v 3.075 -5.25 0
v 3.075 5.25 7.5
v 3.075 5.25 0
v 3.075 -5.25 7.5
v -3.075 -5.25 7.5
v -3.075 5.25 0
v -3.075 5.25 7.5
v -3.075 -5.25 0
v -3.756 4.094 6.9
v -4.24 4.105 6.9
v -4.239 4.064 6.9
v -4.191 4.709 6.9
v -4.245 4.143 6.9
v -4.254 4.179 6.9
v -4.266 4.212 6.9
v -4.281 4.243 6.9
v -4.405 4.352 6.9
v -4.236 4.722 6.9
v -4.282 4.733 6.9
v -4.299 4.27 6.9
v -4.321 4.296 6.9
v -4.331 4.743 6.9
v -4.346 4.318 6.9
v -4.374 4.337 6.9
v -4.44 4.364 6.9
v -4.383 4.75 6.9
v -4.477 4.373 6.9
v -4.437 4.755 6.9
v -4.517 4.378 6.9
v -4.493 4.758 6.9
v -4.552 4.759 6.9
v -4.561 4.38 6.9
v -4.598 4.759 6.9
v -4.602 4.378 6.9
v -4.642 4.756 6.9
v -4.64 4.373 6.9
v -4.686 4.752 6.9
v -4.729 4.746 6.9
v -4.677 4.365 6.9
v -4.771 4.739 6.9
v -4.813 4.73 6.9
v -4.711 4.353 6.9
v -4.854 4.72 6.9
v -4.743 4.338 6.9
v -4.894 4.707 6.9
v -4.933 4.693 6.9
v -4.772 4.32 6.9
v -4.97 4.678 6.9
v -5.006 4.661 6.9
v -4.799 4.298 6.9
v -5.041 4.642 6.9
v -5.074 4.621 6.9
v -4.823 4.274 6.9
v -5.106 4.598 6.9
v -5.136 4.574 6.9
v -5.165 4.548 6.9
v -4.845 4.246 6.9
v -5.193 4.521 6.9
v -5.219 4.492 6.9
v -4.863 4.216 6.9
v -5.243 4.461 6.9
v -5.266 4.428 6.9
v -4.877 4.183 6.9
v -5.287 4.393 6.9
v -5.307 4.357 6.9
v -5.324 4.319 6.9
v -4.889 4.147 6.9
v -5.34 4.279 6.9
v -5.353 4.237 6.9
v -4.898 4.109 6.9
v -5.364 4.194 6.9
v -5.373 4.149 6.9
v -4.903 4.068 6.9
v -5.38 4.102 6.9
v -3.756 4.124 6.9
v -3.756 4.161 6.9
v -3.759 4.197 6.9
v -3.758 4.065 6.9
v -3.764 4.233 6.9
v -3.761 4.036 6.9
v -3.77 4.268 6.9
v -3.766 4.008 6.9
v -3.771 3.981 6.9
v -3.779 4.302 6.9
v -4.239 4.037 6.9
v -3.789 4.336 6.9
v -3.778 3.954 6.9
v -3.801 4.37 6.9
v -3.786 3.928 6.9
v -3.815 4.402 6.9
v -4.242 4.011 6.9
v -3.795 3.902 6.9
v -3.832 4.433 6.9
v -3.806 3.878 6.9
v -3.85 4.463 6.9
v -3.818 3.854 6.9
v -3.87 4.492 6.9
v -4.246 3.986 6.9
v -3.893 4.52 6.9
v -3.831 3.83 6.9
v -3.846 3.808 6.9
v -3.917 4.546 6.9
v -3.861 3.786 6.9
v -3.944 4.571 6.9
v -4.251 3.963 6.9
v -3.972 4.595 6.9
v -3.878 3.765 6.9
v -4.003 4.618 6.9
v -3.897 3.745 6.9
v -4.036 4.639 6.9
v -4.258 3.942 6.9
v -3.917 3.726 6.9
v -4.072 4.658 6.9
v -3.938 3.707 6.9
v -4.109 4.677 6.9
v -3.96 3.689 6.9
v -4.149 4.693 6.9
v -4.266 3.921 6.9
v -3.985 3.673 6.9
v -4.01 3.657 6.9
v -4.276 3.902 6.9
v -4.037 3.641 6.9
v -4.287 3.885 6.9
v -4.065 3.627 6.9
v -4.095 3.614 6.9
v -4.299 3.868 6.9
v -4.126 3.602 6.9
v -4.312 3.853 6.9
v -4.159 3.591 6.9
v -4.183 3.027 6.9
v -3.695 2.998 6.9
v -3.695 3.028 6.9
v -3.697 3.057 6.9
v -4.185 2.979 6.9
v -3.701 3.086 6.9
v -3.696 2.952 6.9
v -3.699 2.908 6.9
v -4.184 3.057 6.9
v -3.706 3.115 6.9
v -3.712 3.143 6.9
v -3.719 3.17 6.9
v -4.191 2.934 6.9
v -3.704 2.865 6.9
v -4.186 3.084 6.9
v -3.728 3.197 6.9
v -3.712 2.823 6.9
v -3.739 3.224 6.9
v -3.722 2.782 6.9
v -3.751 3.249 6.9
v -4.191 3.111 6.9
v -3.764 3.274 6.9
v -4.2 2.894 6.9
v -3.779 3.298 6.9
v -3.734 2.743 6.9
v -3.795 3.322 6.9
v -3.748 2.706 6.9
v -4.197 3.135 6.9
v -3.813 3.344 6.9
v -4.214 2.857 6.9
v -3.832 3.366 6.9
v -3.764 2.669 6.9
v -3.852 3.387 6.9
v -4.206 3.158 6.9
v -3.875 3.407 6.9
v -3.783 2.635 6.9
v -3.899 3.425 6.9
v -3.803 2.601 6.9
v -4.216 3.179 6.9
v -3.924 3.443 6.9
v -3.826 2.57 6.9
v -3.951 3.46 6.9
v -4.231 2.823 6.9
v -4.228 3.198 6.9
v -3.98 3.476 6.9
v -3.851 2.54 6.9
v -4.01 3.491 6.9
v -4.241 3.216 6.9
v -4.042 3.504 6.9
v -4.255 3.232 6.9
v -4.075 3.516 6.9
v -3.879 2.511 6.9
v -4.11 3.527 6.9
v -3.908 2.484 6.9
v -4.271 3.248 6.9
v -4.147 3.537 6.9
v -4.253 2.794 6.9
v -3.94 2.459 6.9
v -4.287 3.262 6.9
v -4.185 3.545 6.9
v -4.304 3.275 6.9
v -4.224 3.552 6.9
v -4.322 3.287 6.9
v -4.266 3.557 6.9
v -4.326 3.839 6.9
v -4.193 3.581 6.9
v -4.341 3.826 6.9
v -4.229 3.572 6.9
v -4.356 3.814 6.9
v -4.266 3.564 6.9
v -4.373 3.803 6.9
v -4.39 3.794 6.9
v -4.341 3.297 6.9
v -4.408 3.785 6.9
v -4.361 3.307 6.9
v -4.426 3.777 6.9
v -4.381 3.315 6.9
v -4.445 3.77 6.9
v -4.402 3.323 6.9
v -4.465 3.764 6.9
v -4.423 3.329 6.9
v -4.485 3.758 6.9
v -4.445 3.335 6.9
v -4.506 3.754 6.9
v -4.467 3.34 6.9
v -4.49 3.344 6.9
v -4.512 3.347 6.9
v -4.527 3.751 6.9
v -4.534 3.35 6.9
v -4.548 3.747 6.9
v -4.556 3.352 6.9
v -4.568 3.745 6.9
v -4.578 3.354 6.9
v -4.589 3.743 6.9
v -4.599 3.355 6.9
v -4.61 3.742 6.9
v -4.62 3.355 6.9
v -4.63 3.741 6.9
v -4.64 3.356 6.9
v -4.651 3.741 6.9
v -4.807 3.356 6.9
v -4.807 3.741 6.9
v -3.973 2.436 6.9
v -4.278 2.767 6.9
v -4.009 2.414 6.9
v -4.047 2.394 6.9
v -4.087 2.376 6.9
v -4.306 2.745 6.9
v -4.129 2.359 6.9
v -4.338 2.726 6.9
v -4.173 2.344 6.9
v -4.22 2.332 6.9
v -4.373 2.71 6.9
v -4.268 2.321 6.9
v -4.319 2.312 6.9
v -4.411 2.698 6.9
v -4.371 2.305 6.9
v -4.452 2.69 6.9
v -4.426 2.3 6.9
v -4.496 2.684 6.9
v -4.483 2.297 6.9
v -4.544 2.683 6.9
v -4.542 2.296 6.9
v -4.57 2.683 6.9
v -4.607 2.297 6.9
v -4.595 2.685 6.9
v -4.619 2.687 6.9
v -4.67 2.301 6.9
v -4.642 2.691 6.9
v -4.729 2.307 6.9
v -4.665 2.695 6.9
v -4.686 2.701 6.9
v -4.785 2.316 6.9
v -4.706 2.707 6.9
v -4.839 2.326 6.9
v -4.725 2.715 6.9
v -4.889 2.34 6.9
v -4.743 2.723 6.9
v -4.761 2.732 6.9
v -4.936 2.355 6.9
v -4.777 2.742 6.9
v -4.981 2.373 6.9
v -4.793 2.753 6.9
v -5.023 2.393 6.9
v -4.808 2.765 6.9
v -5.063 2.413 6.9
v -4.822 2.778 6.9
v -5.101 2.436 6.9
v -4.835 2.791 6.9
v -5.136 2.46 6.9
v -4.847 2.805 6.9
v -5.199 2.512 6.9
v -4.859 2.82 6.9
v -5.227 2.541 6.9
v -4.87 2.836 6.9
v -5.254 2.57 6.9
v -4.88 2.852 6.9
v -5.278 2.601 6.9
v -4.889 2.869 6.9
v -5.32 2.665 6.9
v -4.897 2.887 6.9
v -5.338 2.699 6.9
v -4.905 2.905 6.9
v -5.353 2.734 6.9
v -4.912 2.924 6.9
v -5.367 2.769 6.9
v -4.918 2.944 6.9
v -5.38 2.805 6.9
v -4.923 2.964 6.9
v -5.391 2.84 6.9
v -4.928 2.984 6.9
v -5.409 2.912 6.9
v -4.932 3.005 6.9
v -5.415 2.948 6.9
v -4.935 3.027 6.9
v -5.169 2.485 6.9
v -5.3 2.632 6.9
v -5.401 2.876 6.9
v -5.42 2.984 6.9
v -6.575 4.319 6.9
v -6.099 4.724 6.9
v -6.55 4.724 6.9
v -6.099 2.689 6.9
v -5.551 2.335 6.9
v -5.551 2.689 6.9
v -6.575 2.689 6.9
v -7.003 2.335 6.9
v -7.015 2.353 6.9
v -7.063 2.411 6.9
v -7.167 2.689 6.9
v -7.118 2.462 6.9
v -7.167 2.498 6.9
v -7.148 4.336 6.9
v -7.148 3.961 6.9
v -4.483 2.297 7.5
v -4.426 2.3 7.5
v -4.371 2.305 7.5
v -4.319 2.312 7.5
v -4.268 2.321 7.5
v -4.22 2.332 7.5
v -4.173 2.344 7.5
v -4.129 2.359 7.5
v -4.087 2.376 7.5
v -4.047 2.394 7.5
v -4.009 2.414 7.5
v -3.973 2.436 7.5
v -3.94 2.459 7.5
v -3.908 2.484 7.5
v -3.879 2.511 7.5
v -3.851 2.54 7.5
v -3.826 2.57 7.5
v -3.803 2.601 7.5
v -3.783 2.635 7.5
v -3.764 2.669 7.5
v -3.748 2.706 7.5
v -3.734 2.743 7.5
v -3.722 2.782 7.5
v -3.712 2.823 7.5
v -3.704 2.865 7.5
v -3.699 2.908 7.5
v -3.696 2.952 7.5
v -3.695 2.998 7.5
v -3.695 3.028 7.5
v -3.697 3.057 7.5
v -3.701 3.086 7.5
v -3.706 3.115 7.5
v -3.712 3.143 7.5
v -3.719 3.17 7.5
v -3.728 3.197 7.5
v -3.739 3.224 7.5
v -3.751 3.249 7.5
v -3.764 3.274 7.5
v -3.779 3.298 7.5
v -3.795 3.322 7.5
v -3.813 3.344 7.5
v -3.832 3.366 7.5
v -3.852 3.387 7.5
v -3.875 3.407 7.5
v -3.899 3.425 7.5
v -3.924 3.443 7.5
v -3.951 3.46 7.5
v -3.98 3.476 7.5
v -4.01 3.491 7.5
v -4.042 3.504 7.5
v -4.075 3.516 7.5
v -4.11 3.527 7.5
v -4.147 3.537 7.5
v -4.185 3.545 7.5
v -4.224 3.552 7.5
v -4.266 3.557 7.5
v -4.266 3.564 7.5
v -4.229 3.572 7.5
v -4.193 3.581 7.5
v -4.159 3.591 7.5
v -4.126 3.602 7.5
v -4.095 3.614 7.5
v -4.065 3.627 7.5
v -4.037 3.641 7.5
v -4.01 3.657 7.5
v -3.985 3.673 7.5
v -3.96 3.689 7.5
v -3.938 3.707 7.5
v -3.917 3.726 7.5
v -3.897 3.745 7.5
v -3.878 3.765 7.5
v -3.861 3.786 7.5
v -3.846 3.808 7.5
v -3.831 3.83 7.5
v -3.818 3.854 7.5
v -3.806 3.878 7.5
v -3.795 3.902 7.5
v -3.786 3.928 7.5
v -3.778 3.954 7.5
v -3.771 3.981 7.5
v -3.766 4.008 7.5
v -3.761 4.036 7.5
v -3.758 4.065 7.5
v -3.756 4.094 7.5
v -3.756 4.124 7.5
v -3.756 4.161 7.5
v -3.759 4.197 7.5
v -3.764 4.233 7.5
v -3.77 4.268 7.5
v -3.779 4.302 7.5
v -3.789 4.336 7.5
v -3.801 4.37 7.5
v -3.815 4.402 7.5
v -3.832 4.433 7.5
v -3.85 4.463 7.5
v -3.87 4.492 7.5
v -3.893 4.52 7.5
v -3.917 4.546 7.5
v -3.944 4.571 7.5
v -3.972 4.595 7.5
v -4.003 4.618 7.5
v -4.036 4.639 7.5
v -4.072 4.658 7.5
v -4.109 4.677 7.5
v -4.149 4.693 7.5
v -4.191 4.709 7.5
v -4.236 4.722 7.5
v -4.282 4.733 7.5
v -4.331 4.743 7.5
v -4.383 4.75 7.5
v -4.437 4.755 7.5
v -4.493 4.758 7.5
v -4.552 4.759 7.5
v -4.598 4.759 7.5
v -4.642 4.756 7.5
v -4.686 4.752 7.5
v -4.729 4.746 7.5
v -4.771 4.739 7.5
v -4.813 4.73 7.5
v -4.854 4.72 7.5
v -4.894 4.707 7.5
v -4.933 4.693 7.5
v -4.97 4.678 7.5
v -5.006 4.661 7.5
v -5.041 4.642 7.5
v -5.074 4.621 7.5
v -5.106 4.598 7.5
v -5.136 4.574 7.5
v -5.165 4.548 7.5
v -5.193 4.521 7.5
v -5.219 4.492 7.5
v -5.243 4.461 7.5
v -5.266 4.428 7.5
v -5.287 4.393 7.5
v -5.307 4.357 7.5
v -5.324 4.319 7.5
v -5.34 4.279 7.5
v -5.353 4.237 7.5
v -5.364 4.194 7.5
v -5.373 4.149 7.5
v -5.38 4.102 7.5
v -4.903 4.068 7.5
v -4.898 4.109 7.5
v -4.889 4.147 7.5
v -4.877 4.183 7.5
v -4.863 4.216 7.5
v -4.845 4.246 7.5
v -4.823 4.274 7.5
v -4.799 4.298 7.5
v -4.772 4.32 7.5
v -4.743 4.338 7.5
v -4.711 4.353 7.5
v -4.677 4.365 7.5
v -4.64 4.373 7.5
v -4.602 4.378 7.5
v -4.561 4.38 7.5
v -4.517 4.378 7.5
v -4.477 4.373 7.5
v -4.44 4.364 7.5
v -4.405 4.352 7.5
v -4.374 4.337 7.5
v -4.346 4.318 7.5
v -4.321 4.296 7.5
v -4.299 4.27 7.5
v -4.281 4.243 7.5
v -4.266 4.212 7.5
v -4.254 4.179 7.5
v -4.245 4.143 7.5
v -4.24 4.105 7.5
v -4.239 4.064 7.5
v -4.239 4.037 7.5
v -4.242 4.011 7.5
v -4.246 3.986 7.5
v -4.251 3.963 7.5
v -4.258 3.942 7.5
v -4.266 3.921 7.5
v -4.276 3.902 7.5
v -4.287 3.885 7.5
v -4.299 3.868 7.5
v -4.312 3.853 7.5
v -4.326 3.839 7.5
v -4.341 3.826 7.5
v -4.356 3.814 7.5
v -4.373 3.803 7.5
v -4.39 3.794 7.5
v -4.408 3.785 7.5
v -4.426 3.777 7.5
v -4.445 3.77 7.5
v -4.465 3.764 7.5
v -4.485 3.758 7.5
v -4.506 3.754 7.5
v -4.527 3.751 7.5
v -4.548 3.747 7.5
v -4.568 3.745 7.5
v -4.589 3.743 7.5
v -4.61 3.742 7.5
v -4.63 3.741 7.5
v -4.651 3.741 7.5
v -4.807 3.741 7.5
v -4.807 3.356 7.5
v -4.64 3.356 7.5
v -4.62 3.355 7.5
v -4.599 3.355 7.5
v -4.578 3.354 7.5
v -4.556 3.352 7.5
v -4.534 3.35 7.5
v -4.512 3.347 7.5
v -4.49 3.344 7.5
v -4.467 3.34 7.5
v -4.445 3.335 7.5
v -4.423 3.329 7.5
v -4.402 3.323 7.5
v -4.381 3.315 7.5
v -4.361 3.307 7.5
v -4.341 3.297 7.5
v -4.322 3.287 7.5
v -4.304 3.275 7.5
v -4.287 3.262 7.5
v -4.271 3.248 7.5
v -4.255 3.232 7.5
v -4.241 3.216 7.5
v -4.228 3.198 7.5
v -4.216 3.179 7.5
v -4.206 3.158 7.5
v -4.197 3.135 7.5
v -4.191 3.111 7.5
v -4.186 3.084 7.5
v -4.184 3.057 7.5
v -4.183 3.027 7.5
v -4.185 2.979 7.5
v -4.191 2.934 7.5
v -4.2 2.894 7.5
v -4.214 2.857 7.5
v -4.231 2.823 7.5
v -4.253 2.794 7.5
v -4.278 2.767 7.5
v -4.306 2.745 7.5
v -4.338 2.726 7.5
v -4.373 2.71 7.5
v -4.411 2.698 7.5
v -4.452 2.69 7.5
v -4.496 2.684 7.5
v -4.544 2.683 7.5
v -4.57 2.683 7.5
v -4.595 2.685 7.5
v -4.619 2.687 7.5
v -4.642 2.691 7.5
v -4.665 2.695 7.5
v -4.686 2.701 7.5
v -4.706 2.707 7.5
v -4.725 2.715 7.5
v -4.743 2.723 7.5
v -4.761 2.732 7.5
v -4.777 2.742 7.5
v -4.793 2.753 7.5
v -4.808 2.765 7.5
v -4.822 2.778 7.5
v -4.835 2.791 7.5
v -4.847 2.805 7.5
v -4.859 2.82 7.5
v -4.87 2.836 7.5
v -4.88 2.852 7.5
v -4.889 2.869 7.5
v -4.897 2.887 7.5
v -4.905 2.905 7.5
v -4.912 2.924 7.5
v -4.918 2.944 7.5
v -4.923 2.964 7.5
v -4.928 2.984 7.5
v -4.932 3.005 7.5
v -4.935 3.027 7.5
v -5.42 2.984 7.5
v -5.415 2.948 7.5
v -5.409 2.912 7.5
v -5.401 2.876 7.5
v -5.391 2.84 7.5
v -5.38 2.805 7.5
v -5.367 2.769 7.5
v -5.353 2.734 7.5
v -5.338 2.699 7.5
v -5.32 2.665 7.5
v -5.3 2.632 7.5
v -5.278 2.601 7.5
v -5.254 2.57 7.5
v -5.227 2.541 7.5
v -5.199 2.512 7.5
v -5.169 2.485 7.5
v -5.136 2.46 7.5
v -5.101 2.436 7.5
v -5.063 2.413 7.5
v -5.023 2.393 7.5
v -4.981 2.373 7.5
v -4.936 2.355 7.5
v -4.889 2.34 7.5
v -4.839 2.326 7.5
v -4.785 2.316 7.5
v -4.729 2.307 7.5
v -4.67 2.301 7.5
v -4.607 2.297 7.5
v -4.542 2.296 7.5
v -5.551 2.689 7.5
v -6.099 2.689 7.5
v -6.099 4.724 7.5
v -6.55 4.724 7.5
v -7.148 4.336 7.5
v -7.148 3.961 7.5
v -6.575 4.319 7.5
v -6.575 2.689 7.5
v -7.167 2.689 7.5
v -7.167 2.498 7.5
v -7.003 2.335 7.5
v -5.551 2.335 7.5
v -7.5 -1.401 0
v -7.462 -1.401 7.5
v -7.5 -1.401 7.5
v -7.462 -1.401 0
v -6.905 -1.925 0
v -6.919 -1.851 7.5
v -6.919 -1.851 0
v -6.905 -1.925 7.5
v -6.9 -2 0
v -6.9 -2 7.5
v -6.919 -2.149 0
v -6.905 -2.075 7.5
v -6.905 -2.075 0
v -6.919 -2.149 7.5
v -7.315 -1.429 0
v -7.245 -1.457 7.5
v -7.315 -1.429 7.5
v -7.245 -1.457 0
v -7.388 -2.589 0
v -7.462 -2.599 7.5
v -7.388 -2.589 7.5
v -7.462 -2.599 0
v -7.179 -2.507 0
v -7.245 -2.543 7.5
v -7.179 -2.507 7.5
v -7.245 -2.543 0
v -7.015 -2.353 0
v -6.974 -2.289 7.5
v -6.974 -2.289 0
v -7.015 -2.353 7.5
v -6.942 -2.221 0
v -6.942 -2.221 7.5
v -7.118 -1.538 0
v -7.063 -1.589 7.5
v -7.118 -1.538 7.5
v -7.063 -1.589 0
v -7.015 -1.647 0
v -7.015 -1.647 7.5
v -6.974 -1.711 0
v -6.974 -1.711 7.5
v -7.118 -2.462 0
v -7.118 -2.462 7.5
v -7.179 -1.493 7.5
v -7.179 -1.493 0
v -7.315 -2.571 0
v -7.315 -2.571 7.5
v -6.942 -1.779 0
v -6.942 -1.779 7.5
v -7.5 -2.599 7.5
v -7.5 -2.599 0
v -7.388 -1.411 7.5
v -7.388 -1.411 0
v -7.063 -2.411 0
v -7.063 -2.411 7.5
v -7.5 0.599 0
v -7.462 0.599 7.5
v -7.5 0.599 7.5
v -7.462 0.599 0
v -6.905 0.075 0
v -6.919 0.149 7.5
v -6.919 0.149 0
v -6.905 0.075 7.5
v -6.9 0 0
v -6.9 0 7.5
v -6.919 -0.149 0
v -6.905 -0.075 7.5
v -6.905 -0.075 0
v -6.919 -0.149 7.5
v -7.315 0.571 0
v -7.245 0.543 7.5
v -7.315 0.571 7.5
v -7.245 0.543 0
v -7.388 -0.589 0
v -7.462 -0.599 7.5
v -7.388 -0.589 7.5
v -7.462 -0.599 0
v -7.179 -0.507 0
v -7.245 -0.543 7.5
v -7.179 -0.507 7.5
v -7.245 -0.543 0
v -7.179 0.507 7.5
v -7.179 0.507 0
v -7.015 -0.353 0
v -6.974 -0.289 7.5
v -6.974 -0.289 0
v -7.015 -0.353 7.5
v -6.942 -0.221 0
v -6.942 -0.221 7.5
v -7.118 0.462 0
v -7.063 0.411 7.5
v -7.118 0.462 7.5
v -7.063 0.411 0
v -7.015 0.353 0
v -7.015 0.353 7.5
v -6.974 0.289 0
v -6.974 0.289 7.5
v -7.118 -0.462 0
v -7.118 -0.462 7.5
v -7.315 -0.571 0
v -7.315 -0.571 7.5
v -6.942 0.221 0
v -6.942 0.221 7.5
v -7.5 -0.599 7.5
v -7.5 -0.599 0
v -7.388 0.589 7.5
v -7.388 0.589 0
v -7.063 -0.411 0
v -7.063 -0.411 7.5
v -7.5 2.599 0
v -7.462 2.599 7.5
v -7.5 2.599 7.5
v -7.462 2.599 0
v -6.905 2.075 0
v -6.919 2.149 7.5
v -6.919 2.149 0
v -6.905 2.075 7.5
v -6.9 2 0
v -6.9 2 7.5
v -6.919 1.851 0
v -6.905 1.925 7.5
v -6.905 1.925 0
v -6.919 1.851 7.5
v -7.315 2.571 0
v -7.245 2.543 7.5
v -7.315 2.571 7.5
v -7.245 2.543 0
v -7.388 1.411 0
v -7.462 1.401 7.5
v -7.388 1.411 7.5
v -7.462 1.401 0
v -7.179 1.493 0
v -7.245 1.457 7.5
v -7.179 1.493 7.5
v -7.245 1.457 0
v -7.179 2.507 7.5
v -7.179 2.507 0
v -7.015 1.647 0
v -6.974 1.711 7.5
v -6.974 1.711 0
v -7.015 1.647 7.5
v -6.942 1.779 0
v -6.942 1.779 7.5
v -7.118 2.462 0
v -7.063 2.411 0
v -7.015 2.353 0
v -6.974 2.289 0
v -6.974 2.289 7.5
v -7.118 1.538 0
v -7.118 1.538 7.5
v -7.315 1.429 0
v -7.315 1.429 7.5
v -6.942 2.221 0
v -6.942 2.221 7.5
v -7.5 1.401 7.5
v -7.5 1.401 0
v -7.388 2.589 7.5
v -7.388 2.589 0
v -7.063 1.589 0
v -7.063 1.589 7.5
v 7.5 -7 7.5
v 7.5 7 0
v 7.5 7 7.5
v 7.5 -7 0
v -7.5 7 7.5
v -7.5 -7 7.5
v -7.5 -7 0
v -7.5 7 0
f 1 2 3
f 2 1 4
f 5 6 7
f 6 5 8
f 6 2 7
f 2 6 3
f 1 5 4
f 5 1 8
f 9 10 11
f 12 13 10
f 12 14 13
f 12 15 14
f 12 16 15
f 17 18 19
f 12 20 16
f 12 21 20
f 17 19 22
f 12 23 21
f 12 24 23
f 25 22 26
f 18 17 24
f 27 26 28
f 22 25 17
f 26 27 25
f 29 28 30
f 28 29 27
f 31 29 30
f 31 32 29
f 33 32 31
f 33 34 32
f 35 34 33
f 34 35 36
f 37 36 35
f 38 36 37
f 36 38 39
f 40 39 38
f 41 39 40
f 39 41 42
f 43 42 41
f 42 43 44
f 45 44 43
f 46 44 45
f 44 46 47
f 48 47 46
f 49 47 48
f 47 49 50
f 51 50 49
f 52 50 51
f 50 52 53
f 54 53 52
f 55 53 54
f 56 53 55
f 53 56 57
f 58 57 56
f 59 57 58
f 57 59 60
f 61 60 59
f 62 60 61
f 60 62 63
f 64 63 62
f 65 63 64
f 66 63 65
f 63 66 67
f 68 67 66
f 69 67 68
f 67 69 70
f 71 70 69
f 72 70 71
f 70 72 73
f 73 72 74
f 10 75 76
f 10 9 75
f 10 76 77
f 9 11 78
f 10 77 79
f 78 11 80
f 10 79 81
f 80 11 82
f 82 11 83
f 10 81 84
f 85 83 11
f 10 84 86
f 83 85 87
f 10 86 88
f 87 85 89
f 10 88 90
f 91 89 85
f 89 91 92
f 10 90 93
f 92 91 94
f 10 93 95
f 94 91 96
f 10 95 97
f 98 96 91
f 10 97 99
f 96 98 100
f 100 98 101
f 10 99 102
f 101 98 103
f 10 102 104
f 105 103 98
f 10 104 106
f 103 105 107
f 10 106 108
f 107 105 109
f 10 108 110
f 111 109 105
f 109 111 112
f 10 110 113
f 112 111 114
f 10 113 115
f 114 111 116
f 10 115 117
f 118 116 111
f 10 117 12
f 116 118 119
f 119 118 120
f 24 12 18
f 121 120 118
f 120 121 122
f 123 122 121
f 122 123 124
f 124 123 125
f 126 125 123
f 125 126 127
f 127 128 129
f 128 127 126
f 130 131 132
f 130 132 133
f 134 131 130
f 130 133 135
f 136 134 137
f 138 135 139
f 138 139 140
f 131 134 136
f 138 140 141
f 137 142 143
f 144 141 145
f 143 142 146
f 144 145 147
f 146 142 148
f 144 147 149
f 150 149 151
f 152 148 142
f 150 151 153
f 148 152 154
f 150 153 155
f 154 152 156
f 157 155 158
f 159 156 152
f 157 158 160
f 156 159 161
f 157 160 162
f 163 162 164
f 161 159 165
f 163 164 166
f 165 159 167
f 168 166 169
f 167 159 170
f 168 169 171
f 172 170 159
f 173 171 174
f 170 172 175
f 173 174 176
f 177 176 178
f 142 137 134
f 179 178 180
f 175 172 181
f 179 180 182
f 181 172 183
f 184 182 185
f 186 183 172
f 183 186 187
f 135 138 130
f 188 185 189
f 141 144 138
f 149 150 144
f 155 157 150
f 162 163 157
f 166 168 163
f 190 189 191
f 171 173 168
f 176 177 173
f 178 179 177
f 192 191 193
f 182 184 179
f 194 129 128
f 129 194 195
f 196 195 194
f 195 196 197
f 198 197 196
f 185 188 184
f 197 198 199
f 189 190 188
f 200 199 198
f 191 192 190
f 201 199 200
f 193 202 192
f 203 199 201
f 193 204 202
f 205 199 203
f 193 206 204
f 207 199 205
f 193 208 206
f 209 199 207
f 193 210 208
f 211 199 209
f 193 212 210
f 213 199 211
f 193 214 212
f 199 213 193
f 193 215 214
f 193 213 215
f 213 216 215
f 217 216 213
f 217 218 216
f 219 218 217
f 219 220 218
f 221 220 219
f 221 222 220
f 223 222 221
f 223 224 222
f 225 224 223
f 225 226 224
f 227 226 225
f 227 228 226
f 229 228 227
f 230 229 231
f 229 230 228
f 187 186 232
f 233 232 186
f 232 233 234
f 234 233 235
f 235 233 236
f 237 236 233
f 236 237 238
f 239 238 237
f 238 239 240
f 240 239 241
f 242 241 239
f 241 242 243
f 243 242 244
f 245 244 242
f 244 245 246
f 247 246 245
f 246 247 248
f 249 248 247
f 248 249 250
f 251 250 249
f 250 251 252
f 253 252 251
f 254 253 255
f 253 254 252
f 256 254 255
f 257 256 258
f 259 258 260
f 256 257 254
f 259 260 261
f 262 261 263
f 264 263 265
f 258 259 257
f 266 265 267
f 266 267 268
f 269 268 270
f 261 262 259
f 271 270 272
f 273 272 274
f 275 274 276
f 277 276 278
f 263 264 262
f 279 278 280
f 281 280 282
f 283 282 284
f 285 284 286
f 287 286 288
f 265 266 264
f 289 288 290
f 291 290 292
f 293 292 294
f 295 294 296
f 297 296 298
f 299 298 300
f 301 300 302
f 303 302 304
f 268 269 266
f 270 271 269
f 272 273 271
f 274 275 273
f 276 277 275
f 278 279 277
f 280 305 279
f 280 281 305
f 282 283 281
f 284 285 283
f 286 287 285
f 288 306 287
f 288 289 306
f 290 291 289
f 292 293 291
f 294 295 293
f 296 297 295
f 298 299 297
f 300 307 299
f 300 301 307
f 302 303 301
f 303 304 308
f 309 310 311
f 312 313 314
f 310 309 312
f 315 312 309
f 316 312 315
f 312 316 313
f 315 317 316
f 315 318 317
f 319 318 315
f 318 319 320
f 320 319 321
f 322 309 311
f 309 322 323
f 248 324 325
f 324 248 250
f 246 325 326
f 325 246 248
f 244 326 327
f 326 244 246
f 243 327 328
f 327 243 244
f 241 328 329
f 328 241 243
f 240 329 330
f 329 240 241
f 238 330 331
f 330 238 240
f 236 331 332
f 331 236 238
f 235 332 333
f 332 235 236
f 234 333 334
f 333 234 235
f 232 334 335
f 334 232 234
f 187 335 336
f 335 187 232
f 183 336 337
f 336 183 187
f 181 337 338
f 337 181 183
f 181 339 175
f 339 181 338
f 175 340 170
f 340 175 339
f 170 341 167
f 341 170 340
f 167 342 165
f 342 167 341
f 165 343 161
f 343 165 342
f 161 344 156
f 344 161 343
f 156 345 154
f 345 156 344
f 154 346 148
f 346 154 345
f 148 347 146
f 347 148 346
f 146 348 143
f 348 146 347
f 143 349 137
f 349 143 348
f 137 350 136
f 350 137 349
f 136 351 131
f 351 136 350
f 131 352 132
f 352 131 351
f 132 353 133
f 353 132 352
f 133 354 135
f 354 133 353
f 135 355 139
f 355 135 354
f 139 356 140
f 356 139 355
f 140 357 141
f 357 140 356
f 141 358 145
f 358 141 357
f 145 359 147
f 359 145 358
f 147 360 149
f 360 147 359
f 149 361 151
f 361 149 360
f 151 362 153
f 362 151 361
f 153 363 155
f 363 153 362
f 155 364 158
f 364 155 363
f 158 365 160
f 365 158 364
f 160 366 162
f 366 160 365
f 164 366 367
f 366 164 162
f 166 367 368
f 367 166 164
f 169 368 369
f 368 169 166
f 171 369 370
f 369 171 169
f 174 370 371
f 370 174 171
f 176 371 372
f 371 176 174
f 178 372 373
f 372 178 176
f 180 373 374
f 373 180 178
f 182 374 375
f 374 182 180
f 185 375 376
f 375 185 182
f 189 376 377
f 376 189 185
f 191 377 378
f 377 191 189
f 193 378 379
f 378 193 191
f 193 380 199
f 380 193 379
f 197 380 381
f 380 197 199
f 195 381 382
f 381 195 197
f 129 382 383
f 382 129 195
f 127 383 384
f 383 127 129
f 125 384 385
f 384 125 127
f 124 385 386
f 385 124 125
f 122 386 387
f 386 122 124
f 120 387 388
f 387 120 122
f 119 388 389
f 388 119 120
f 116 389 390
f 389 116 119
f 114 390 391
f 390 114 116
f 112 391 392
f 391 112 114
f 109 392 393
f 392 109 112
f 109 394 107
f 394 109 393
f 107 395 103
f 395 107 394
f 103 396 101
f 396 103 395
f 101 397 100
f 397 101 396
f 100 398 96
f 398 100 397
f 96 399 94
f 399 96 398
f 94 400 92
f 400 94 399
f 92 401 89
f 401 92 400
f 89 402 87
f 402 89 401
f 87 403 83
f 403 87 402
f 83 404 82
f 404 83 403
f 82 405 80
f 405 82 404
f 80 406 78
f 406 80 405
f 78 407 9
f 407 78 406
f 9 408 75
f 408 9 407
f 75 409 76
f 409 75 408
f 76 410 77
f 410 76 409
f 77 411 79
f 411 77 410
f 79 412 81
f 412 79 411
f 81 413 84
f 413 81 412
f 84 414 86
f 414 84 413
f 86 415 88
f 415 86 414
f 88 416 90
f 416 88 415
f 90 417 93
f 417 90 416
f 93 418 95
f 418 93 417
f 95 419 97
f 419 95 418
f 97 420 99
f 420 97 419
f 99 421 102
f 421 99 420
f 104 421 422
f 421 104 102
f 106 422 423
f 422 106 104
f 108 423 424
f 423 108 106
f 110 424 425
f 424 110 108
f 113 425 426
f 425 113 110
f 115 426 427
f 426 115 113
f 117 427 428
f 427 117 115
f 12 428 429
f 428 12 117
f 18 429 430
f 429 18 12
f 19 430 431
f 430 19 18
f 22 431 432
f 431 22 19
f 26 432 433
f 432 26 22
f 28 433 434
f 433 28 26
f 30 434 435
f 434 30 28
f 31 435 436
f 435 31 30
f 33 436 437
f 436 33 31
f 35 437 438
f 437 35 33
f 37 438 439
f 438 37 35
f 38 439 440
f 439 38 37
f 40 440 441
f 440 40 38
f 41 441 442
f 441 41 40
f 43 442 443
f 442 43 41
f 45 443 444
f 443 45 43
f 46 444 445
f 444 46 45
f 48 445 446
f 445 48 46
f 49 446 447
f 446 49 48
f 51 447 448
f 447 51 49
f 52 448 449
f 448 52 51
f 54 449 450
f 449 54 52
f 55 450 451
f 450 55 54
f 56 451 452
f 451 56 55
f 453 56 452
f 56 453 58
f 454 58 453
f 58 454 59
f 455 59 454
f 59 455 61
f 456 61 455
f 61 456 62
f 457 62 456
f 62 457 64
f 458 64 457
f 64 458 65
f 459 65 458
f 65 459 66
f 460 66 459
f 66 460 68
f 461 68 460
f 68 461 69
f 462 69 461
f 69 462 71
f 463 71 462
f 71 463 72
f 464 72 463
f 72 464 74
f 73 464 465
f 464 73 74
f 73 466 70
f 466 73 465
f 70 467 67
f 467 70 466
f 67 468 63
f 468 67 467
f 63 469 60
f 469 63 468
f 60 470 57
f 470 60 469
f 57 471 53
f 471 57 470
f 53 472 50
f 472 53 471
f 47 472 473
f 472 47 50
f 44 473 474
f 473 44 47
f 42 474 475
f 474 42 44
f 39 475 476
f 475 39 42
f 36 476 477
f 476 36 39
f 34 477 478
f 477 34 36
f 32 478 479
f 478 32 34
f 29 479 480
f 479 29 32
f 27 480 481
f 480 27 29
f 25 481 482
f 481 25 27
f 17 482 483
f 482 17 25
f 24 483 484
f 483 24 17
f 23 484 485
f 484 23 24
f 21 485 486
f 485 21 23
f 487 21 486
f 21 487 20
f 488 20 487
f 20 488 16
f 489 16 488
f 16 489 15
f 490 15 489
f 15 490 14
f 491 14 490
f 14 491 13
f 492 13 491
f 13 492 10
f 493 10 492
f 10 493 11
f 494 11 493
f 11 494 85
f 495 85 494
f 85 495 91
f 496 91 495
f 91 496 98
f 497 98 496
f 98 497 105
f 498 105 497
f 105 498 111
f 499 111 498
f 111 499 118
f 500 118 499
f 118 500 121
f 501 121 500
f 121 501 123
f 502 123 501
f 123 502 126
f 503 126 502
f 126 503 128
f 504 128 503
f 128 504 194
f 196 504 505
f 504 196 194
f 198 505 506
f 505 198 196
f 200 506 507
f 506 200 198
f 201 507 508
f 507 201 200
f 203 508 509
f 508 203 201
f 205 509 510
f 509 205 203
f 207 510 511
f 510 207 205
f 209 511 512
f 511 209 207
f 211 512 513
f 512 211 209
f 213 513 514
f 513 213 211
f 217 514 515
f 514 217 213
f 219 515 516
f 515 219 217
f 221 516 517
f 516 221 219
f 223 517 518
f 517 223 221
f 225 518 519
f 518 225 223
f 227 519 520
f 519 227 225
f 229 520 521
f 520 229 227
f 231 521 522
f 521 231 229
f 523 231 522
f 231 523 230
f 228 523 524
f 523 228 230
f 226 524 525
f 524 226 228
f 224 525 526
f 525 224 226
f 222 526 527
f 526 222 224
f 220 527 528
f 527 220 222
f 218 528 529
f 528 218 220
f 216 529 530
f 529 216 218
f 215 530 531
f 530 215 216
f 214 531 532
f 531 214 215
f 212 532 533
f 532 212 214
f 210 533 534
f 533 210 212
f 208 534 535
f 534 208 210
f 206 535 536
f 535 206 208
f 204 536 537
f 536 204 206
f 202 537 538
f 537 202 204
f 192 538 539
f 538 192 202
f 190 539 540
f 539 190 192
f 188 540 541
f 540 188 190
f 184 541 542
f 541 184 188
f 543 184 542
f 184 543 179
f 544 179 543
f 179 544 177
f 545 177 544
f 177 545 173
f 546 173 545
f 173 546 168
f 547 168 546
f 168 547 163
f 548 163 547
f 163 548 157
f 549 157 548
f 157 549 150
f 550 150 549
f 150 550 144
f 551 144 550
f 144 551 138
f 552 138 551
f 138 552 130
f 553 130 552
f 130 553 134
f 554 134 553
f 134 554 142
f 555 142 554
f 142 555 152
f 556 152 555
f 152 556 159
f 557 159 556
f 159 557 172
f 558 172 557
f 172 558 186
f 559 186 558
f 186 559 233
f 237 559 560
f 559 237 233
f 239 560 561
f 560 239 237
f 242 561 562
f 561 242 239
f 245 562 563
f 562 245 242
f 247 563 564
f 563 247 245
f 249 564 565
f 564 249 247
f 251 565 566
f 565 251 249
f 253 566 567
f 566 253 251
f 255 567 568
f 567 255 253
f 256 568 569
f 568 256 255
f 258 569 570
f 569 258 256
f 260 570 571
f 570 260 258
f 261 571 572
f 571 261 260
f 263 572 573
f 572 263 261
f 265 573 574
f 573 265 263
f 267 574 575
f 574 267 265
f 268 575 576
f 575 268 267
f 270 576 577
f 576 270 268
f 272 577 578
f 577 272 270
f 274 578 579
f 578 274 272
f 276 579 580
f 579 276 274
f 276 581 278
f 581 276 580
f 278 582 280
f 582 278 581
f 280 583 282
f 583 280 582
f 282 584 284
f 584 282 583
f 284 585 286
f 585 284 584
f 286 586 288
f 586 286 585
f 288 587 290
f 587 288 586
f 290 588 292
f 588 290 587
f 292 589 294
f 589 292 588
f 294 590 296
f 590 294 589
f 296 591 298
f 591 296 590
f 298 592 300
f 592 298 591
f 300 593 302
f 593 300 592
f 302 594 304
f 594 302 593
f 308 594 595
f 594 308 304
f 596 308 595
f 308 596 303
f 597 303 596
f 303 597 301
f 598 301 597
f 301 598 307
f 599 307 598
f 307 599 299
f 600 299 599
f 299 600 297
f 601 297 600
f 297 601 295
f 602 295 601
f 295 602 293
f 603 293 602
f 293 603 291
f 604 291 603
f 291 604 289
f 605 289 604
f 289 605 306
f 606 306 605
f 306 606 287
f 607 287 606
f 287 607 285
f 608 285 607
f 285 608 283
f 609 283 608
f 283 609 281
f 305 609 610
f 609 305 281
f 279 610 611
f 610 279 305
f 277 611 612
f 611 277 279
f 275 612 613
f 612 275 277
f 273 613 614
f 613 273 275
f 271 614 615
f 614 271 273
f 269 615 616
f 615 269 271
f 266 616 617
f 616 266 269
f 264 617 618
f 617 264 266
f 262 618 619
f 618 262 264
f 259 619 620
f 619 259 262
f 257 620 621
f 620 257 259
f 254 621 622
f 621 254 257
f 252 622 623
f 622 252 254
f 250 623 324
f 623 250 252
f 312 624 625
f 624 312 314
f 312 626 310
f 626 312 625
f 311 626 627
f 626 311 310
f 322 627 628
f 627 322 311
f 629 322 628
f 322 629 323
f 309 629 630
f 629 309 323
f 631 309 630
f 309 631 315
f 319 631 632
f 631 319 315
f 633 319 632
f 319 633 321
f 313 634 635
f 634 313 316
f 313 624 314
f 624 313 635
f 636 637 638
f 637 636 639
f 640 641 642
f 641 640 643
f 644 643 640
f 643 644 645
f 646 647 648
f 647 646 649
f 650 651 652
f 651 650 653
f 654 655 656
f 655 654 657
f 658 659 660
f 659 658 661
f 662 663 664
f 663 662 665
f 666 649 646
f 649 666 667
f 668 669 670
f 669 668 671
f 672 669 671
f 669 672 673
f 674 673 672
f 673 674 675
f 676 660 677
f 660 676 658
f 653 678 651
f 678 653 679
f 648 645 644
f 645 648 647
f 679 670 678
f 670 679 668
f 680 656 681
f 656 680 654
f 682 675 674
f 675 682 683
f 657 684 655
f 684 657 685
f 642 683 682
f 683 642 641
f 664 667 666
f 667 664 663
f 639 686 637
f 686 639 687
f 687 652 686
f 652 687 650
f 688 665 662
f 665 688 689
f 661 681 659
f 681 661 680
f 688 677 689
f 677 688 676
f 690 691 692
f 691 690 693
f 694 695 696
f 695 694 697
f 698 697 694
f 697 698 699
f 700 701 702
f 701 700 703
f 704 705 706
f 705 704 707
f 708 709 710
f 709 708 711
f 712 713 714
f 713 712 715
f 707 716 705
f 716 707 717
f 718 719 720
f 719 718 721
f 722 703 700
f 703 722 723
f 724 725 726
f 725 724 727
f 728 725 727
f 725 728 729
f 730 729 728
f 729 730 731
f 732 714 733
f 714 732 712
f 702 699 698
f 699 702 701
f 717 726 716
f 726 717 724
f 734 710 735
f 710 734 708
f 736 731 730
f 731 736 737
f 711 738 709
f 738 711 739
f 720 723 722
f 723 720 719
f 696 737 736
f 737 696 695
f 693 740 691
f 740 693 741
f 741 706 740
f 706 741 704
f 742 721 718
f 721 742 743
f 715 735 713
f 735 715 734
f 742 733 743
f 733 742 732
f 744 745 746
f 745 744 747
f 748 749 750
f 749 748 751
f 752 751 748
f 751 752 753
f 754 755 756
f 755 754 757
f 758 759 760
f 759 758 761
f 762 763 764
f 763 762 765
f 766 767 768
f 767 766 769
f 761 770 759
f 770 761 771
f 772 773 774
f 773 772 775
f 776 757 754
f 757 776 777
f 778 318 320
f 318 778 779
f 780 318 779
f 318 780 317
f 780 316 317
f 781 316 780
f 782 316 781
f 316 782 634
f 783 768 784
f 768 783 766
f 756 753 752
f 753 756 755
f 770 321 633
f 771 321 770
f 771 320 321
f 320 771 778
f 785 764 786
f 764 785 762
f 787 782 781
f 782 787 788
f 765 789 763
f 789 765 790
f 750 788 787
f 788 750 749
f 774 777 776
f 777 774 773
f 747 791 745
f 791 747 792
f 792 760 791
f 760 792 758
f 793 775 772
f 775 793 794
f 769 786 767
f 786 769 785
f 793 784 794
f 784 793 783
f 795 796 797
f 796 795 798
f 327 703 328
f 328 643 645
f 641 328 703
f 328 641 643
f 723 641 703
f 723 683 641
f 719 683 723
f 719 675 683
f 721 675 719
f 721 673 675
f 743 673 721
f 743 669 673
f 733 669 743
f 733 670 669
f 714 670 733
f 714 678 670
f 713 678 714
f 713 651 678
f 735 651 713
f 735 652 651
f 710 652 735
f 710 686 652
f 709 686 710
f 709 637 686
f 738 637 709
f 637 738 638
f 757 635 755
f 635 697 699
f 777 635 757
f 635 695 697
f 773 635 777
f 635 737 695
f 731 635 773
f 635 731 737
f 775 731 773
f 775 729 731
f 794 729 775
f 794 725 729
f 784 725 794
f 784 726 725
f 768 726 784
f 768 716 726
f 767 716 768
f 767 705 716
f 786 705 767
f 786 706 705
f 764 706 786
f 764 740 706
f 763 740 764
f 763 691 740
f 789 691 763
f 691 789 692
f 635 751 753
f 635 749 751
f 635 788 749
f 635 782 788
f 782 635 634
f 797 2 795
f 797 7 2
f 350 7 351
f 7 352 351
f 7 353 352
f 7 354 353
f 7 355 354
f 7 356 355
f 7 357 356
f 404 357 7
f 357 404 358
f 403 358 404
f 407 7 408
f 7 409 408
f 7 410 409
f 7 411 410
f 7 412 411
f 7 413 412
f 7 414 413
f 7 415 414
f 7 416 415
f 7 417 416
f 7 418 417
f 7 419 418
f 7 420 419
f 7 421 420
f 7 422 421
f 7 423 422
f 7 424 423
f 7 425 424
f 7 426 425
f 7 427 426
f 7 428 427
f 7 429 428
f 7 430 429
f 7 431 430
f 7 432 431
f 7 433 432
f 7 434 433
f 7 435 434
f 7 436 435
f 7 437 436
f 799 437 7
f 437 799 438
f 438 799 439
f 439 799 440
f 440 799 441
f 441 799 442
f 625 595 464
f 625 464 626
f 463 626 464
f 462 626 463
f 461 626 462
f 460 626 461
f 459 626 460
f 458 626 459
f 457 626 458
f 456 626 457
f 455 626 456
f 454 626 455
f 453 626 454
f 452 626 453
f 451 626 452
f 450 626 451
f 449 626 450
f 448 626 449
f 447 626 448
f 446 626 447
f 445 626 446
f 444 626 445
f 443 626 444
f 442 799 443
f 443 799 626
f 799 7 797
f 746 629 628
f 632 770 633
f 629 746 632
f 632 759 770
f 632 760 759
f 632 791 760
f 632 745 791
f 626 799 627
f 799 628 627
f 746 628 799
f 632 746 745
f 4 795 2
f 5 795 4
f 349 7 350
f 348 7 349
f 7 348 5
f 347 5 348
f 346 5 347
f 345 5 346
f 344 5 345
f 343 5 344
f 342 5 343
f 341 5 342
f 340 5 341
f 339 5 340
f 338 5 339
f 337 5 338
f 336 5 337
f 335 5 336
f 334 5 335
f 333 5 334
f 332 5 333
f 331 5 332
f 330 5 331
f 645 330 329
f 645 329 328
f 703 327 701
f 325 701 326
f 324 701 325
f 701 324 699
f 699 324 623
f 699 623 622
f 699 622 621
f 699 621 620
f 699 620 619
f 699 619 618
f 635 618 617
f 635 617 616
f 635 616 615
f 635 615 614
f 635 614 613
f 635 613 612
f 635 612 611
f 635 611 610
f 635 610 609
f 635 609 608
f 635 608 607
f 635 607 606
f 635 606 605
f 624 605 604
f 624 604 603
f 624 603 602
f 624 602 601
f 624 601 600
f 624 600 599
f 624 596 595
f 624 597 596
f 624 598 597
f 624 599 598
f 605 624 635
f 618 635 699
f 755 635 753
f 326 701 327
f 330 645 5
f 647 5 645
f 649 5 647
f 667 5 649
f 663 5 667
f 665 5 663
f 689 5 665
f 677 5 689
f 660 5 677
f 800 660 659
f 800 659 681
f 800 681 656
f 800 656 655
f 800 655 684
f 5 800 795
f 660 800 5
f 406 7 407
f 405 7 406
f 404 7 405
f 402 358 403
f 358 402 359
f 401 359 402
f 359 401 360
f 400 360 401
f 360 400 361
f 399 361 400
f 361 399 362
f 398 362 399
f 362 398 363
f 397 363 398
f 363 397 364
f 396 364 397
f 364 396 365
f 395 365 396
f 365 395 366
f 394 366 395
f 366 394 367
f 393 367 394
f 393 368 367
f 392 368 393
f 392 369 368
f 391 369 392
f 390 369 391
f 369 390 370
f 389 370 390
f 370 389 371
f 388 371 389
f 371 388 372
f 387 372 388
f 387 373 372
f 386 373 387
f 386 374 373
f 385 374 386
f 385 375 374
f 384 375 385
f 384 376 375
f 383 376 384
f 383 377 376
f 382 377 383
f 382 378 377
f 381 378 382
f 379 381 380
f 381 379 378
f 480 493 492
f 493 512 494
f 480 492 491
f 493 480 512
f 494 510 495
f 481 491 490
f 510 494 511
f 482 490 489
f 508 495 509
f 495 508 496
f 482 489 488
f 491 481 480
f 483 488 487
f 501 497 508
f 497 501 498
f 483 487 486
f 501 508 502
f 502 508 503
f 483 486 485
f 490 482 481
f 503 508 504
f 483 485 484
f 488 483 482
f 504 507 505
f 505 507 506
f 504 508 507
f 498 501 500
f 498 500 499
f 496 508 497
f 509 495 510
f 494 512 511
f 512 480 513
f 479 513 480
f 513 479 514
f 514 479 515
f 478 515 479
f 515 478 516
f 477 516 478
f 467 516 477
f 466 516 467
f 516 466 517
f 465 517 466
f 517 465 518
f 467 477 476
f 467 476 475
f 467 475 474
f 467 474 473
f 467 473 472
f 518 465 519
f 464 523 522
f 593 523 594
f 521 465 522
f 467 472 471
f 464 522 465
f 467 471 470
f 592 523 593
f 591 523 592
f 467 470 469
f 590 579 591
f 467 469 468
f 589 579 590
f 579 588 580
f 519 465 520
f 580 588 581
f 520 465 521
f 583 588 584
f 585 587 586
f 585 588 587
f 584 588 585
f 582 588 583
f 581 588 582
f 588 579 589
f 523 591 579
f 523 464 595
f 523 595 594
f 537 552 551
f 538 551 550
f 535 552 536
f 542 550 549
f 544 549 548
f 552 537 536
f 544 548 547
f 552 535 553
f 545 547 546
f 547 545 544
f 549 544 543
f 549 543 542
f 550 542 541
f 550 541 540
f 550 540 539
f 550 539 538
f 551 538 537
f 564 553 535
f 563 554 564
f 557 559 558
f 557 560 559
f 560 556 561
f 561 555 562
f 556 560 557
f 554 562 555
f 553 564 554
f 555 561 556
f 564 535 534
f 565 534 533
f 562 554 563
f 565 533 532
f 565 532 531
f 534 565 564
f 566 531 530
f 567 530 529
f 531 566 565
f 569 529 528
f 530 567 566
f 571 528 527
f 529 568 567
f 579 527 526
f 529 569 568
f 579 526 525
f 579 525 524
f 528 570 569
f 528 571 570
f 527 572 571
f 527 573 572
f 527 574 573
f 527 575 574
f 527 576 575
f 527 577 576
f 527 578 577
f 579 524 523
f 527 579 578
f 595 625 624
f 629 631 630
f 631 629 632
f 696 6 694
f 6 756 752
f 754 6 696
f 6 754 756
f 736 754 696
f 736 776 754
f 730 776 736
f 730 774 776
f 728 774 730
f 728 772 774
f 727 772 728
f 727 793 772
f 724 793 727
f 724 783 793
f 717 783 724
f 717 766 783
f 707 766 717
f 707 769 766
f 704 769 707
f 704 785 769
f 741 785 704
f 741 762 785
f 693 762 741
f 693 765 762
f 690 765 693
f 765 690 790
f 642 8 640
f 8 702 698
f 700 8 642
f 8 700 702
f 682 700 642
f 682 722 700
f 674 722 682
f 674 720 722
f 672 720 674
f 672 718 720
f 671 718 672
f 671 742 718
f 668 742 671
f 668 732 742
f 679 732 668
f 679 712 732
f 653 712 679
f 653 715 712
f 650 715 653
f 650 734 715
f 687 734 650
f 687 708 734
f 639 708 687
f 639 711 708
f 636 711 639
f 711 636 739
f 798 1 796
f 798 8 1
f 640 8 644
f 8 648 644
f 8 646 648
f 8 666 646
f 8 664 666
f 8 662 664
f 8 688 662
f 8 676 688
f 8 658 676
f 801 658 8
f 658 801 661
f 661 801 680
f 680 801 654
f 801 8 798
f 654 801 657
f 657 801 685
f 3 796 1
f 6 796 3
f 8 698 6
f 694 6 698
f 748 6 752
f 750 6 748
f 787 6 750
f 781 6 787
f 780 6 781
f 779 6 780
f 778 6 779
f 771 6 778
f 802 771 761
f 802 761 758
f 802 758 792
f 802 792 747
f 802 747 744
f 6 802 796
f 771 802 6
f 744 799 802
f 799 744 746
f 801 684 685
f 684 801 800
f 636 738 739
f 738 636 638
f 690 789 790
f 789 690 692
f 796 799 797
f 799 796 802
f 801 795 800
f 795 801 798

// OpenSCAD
$fn = 50;

difference() {
	union() {
		translate(v = [0, -5, 0]) {
			rotate(a = [0, 0, 0]) {
				difference() {
					union() {
						translate(v = [-7.5, -2.0, 0]) {
							cube(size = [15.0, 14.0, 7.5]);
						}
					}
					union() {
						translate(v = [-3.075, -0.25, -0.1]) {
							cube(size = [6.15, 10.5, 7.7]);
						}
						translate(v = [-5.5, 8.5, 6.9]) {
							linear_extrude(height = 0.7) {
								text(font = "Arial:style=Bold", halign = "center", size = 2.5, text = "13", valign = "center");
							}
						}
						translate(v = [-7.5, 3, -0.1]) {
							cylinder(h = 7.7, r = 0.6);
						}
						translate(v = [-7.5, 5, -0.1]) {
							cylinder(h = 7.7, r = 0.6);
						}
						translate(v = [-7.5, 7, -0.1]) {
							cylinder(h = 7.7, r = 0.6);
						}
					}
				}
			}
		}
	}
	union();
}
